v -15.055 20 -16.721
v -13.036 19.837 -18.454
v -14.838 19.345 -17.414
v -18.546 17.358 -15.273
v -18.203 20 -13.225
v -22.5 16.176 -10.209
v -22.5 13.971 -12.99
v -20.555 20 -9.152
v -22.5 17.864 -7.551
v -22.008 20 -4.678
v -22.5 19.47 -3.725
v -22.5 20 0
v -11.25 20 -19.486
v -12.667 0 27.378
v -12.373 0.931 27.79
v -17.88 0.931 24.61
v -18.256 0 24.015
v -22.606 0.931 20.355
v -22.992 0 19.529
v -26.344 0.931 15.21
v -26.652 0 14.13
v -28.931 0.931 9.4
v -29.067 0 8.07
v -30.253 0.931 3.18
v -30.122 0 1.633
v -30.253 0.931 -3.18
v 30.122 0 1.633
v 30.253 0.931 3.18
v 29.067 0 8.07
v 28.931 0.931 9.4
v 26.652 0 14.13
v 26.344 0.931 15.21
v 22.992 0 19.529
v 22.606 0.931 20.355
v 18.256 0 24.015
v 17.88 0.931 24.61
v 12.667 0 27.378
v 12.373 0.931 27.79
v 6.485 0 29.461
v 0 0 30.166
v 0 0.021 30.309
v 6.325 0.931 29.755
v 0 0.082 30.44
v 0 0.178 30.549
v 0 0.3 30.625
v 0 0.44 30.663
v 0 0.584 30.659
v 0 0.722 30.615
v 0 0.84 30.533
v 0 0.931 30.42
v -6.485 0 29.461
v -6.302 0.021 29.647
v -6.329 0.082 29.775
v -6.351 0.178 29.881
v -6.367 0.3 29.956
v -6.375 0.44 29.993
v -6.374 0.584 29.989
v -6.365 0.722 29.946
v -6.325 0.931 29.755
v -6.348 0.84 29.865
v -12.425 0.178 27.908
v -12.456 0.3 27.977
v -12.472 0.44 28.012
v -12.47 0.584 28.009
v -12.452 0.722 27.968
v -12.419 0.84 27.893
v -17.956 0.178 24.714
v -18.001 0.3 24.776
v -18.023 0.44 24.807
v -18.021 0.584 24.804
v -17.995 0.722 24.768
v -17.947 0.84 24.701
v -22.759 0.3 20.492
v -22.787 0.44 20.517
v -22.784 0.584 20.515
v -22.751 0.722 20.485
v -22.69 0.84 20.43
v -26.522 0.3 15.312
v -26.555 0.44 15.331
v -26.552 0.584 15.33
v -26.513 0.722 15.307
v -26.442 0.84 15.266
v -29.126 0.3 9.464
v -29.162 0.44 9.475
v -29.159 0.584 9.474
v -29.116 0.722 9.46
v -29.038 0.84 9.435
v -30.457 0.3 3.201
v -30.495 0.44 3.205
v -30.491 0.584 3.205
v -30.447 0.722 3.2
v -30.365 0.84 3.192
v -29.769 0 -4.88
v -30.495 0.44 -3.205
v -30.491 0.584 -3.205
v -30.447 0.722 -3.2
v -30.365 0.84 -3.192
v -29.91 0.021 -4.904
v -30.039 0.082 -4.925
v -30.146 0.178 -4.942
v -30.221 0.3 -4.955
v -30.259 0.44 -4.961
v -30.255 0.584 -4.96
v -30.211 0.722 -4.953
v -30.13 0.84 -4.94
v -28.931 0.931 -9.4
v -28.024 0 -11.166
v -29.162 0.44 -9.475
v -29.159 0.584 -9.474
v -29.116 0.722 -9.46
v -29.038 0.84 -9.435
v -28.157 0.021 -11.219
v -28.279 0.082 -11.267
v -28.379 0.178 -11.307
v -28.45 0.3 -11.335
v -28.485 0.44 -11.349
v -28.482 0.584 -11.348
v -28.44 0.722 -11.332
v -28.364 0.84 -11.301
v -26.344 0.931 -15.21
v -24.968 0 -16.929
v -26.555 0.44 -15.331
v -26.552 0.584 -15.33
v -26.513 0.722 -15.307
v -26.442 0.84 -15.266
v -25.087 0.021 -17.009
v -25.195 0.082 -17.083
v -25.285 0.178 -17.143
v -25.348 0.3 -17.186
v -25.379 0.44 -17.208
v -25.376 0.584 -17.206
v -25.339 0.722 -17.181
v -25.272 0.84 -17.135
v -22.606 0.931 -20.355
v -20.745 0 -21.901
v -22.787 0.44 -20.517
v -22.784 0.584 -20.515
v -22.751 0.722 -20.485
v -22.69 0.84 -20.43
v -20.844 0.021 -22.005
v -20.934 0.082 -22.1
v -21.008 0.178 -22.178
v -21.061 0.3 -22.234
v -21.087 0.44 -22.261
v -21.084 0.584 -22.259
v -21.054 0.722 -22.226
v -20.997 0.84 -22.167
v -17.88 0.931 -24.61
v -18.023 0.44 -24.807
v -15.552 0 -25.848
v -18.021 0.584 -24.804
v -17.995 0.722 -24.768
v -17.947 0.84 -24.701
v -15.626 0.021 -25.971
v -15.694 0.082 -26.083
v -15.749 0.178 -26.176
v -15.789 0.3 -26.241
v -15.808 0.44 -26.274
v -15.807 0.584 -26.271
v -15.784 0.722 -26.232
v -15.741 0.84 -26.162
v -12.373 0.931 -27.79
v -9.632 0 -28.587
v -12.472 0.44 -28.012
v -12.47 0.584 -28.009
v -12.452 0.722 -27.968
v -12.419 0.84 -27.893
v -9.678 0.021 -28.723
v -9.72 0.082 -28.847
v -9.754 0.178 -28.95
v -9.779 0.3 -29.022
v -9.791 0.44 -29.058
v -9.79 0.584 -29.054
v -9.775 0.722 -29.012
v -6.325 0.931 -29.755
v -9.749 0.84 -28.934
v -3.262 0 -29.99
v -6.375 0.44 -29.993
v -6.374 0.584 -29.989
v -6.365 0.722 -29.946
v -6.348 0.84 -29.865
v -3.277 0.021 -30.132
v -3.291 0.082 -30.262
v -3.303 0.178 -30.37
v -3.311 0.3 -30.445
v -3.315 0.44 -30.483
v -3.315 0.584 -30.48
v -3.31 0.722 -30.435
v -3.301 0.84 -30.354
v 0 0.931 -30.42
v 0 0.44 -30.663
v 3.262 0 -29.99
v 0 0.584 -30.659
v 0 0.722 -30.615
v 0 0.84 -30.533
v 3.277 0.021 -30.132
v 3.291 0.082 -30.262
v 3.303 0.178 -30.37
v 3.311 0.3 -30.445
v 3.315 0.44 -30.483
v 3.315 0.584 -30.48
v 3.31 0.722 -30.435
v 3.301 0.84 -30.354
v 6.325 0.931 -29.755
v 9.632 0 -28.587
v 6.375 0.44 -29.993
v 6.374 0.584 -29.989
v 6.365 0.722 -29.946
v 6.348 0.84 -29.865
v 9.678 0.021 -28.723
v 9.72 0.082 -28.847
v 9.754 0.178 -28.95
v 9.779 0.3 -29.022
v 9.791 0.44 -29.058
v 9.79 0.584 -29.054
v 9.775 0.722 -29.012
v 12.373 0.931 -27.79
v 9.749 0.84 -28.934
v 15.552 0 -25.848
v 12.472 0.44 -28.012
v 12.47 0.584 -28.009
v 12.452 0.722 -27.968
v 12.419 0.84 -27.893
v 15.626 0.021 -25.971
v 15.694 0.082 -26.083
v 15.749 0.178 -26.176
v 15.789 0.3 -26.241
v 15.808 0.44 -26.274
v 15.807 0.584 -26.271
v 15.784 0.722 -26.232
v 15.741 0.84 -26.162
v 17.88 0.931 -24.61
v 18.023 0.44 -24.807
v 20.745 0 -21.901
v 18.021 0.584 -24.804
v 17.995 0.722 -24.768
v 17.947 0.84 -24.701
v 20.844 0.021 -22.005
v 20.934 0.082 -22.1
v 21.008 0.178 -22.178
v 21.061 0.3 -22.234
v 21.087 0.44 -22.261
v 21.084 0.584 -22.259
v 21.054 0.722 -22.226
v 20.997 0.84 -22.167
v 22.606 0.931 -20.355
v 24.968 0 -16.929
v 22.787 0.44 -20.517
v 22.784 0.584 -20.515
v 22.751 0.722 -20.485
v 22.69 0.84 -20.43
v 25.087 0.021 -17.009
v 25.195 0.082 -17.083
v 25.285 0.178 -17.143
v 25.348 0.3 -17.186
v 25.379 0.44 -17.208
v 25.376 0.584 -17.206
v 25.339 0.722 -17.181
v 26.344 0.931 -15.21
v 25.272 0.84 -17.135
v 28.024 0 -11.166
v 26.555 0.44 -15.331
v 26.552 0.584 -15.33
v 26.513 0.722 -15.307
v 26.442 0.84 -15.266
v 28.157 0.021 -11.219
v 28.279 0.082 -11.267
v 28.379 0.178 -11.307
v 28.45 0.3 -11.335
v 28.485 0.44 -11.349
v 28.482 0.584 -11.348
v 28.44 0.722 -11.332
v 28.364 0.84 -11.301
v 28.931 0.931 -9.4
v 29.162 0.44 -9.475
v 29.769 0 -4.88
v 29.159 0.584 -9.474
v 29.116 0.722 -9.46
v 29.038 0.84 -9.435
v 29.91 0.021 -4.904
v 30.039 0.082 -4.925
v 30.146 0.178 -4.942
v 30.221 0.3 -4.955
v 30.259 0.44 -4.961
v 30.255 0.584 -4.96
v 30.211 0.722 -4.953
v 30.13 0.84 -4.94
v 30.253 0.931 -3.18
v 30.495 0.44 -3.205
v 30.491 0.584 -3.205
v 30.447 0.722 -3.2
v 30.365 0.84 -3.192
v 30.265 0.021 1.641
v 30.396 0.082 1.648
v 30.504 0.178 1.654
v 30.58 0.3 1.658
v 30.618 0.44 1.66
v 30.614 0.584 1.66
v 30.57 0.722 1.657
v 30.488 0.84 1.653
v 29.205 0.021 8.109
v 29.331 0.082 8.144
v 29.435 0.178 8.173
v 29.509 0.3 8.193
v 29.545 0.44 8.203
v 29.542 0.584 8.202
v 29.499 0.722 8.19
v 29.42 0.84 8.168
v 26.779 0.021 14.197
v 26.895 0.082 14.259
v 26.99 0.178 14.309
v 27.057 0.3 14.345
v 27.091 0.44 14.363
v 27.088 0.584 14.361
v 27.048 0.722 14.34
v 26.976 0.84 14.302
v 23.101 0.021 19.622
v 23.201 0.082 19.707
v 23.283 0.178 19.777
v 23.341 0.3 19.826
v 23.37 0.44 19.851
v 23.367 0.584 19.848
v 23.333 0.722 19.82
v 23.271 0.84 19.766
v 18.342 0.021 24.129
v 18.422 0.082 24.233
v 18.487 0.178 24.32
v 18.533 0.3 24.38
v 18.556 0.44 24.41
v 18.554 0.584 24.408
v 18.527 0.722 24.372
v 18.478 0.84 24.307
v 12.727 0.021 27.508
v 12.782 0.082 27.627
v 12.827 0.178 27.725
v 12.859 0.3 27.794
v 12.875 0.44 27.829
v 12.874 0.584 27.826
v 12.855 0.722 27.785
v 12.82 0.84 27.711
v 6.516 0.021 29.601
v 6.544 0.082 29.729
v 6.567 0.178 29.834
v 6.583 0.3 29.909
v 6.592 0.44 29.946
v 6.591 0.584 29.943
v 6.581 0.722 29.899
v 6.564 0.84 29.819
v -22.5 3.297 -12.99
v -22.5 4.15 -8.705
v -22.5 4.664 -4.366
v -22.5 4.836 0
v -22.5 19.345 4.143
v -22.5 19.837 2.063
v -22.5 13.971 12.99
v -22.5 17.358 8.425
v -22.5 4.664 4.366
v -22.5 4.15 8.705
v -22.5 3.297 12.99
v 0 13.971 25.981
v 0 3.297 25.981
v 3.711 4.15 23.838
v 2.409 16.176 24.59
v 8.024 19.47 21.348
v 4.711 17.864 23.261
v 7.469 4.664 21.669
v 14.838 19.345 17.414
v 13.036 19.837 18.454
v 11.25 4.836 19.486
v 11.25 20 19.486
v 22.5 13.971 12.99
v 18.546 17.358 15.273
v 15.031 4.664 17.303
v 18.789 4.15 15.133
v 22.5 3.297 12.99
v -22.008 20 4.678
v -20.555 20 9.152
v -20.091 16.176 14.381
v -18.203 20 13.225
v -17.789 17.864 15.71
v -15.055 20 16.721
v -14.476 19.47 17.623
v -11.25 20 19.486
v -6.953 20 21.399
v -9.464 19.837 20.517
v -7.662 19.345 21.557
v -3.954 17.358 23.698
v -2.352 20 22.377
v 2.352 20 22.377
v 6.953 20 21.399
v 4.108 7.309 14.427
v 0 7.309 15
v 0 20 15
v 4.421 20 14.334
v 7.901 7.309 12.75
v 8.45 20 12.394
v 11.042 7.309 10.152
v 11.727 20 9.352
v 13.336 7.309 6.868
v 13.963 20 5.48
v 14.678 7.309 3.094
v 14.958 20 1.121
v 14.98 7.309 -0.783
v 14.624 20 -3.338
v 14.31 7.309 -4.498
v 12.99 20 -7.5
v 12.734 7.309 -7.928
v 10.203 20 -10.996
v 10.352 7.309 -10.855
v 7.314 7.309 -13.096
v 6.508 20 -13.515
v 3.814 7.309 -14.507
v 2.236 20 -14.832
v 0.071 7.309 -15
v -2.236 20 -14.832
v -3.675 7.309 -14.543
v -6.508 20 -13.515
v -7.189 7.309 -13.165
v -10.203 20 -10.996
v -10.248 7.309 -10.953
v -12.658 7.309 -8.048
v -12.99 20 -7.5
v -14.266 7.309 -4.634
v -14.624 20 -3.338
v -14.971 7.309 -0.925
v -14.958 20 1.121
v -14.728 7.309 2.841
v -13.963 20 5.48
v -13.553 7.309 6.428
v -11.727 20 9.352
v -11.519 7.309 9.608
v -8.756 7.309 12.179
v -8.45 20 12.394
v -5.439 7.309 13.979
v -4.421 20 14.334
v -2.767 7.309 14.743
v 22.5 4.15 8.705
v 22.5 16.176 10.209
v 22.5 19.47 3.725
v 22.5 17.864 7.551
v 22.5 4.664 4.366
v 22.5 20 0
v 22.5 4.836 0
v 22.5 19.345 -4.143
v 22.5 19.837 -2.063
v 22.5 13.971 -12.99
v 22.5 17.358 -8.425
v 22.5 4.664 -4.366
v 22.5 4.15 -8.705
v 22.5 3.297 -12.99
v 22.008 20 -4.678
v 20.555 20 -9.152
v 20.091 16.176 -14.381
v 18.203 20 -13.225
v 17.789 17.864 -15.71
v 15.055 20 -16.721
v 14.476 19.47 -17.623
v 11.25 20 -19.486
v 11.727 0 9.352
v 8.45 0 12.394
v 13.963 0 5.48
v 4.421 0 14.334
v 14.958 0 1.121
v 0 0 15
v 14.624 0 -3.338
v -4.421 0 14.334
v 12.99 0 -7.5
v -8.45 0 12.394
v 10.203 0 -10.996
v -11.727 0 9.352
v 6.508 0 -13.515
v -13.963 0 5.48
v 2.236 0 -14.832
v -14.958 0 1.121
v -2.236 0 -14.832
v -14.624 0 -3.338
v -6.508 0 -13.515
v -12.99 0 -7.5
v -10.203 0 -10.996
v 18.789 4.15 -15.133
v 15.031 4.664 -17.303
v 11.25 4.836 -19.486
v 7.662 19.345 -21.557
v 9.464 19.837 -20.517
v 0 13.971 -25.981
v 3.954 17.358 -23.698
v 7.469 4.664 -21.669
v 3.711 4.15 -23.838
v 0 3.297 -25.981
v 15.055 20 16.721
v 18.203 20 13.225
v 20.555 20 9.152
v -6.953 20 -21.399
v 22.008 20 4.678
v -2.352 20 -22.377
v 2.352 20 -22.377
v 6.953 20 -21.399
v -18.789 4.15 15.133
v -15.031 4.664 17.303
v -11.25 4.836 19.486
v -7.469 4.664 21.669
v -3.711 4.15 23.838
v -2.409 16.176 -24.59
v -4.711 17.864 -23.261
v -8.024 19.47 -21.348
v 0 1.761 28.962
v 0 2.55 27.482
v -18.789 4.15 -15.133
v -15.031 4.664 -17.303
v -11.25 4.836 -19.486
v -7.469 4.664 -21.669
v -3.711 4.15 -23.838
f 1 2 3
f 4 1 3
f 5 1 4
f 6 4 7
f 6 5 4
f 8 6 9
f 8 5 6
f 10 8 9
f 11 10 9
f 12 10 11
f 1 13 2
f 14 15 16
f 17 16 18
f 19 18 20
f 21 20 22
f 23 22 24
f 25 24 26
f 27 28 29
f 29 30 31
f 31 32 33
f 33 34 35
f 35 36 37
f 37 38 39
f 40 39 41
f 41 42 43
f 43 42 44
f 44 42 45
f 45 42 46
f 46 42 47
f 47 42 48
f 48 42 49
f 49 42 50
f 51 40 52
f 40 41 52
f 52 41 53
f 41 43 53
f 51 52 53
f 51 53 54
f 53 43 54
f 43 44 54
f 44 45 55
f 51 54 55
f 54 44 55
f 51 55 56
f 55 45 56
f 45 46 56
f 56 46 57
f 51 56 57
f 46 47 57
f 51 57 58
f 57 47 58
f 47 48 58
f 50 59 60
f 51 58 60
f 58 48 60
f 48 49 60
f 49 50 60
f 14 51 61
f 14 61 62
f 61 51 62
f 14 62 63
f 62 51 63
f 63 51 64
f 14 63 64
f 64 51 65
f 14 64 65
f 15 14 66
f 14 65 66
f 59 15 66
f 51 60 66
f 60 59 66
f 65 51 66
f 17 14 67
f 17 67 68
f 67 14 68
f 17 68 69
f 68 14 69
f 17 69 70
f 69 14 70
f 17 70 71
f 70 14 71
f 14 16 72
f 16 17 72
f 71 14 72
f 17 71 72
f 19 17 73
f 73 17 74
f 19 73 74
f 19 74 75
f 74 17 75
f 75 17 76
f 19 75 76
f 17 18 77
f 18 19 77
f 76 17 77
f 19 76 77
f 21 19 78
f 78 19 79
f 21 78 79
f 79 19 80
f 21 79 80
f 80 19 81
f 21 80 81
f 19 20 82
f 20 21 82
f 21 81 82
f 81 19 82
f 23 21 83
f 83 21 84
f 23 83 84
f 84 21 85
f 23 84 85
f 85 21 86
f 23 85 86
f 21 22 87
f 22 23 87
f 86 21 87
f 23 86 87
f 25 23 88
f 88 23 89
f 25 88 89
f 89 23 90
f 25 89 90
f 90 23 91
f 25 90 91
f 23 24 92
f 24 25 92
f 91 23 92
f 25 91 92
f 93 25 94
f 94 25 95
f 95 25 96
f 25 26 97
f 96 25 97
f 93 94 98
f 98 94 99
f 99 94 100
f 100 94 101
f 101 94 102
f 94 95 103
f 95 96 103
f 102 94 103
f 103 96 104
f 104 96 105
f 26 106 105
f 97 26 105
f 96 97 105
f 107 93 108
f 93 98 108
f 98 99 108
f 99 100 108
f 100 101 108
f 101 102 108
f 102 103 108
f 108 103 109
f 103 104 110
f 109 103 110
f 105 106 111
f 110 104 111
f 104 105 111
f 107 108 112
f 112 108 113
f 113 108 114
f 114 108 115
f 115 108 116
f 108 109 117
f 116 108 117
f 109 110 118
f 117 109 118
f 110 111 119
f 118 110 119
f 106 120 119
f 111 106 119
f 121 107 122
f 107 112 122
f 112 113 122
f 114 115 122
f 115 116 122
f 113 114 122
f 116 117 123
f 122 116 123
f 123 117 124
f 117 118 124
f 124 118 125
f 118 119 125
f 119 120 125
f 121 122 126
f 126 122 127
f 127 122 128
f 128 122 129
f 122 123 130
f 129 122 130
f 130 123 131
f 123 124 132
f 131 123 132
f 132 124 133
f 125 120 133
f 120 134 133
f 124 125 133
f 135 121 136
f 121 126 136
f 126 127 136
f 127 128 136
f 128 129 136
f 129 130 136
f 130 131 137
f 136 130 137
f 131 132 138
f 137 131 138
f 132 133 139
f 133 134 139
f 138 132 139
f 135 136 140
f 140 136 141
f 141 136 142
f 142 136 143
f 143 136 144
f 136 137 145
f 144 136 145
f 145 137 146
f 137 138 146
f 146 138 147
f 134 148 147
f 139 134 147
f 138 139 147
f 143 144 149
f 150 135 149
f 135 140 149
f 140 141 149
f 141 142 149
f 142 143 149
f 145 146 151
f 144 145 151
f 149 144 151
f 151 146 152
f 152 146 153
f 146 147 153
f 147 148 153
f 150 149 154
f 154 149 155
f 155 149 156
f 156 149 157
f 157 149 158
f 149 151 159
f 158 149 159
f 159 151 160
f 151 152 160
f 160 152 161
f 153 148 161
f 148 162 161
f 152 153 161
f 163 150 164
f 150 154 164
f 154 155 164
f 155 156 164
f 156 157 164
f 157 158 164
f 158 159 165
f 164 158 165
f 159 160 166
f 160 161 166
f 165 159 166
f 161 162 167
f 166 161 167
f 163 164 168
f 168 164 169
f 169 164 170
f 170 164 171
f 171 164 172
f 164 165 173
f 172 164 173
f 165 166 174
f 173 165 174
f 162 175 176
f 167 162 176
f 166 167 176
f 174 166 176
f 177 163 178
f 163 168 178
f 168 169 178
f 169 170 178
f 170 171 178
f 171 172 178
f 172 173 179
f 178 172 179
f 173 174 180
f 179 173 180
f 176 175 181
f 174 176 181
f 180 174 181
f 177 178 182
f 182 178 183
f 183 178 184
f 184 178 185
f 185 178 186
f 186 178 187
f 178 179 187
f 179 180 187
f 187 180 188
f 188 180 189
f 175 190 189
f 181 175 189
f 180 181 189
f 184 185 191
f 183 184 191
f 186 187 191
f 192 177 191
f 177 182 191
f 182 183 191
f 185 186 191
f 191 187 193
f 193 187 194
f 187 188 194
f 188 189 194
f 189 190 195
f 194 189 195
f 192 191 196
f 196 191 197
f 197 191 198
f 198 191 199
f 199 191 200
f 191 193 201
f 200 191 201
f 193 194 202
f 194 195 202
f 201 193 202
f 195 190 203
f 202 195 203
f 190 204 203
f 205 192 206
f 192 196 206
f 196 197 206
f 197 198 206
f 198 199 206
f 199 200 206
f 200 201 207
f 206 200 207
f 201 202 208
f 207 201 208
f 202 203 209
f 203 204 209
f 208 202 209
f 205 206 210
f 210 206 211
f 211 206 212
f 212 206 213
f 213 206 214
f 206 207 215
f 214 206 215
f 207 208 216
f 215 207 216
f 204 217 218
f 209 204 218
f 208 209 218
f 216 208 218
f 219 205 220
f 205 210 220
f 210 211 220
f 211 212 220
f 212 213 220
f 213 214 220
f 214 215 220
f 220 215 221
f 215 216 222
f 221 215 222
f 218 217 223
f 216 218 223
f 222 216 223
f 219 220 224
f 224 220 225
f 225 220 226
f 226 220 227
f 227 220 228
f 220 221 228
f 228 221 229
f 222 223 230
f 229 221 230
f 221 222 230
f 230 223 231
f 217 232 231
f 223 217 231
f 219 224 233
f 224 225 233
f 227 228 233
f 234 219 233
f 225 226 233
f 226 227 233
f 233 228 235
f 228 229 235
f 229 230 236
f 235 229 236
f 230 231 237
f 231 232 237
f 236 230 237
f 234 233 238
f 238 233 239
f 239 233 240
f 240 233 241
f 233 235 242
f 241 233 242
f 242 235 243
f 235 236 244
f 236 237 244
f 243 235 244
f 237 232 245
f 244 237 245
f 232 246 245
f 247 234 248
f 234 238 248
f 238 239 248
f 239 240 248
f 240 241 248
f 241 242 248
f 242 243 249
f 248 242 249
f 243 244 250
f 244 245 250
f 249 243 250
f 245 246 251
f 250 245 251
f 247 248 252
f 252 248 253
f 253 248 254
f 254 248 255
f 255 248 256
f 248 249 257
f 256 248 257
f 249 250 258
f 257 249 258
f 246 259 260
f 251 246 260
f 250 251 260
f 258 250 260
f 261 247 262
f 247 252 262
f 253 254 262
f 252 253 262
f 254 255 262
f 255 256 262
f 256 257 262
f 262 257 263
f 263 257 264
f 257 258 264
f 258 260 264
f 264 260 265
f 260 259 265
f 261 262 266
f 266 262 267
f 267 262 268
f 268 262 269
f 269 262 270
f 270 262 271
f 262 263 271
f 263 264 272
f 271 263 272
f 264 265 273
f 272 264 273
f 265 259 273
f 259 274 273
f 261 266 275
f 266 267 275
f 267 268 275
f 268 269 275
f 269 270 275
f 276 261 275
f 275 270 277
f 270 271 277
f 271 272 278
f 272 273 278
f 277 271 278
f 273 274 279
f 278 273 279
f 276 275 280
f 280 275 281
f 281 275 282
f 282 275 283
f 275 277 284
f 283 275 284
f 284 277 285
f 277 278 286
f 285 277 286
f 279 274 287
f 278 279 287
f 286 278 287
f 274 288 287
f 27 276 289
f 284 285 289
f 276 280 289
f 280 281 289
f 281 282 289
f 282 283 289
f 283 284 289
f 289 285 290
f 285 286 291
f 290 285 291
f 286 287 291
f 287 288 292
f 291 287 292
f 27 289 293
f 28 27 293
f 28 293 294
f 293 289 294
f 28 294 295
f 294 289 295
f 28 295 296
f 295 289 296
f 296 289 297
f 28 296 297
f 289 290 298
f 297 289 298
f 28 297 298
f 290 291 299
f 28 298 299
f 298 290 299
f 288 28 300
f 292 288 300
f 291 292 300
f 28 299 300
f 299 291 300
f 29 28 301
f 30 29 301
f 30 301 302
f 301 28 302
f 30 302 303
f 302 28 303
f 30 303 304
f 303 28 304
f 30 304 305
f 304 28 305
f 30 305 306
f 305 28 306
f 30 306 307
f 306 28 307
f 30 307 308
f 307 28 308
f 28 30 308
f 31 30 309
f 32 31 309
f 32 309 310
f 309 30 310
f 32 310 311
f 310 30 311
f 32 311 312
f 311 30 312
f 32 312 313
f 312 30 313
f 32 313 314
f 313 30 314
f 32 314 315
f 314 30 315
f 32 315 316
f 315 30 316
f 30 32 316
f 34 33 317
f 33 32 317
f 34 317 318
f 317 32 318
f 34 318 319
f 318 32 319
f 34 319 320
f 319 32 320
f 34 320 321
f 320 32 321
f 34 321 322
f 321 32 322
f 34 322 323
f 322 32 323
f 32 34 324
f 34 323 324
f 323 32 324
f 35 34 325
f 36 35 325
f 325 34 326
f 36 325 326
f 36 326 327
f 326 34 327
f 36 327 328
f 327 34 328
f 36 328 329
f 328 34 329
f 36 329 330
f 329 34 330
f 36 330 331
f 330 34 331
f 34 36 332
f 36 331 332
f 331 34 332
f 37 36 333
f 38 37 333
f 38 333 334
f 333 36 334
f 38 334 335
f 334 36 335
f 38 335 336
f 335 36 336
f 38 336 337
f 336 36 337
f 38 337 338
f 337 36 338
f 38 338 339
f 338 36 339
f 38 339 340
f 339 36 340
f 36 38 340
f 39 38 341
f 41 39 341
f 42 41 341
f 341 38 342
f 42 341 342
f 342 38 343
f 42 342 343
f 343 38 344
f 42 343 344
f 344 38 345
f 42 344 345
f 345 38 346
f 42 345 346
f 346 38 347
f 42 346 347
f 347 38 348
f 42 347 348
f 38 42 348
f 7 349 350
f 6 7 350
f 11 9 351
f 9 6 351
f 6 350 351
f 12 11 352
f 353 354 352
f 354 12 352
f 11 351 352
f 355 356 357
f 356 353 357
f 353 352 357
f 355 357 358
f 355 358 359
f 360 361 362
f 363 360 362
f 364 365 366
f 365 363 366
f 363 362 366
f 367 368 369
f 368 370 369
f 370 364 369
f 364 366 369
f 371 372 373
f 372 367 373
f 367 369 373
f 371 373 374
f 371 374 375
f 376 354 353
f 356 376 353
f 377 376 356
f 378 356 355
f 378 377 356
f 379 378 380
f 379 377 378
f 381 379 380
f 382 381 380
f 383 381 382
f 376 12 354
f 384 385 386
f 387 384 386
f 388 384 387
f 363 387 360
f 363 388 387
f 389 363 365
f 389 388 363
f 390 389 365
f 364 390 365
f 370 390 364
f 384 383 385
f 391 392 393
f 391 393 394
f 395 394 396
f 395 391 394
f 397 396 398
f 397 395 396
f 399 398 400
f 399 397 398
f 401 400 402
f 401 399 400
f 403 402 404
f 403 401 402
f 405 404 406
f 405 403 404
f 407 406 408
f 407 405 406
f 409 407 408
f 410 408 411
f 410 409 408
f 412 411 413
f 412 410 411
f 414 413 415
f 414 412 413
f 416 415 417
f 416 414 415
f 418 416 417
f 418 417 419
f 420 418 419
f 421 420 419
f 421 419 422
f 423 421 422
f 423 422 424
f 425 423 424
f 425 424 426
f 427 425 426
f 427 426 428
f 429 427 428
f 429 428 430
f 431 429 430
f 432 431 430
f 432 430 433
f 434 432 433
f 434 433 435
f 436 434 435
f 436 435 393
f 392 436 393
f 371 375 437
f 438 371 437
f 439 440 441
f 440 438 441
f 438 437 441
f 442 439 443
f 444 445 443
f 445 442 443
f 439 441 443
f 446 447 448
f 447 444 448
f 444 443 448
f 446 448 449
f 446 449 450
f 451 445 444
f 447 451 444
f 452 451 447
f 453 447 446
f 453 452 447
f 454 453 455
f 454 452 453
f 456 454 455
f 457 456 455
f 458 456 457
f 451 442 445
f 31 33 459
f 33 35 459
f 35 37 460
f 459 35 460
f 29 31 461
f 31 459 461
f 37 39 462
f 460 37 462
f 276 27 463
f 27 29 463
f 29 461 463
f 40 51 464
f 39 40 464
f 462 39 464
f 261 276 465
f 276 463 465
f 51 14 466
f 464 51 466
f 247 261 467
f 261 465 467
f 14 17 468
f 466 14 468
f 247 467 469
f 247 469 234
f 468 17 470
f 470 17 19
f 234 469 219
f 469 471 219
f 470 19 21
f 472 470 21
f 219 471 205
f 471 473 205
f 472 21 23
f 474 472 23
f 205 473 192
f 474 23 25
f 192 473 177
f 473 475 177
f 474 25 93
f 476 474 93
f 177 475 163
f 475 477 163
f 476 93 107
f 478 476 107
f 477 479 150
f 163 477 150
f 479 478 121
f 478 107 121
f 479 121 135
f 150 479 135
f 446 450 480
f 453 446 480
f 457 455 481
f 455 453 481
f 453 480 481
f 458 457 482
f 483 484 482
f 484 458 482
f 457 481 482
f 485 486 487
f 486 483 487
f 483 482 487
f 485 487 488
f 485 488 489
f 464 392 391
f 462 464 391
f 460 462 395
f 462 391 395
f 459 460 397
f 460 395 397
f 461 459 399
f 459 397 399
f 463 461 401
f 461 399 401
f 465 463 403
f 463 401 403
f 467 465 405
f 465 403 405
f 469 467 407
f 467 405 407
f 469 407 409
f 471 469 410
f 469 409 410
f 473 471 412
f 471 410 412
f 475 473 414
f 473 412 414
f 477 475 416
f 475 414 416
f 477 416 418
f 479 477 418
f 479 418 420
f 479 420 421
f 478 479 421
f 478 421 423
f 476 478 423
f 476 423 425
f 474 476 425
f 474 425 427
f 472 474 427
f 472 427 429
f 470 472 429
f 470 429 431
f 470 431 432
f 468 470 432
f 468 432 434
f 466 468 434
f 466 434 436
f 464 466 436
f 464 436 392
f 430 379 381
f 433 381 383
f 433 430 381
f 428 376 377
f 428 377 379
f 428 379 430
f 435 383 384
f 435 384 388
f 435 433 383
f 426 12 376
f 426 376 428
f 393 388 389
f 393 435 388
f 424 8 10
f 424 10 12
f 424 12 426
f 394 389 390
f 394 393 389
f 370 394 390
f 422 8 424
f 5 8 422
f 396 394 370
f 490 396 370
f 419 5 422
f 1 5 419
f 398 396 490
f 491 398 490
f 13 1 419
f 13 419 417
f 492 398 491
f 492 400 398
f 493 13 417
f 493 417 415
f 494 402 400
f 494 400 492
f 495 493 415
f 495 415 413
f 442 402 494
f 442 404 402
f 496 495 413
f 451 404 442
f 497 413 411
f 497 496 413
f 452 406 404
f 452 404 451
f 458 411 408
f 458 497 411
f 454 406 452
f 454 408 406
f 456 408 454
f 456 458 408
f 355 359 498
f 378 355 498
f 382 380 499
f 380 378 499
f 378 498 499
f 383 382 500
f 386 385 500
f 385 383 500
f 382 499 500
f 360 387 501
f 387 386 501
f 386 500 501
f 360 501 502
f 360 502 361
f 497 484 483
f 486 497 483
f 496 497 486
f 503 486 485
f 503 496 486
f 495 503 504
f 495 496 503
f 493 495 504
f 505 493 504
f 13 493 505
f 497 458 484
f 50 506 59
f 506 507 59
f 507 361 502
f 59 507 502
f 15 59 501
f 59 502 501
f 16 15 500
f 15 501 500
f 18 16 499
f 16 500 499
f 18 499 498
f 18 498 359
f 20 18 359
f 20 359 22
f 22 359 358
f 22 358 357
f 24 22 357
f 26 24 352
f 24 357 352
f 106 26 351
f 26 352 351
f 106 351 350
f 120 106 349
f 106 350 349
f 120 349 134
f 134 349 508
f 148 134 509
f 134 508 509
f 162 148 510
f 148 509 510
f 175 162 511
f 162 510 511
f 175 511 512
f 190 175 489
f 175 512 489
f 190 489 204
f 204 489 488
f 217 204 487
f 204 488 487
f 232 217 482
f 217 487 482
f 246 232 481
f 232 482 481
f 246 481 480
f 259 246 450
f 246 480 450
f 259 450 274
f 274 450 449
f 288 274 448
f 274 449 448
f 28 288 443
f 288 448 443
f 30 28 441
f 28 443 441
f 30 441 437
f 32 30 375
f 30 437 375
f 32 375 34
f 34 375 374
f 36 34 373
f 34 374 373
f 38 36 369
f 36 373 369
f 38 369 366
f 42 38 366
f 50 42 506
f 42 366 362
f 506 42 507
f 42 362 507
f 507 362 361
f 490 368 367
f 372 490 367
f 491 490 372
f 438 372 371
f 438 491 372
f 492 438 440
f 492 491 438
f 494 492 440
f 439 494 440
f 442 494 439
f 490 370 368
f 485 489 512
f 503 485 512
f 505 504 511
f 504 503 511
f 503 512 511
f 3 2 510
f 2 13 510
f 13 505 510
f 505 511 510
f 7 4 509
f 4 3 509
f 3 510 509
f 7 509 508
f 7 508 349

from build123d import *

# Parameters (mm, degrees)
SKETCH1_R           = 15
BOSS_EXTRUDE1_DEPTH = 20
SKETCH2_OUTSIDE_W   = 104.228
SKETCH2_OUTSIDE_H   = 104.228
SKETCH2_OUTSIDE_R   = 22.5
CUT_EXTRUDE1_DEPTH  = 20
CUT_EXTRUDE1_DRAFT  = -30
CUT_EXTRUDE2_REACH  = 49.758
SKETCH4_R           = 15


with BuildPart() as part:
    # Sketch1 → Boss-Extrude1 (new body)
    with BuildSketch(Plane(origin=(0, 0, 0), x_dir=(1, 0, 0), z_dir=(0, 1, 0))):
        Polygon((0, 25.980762114), (-22.5, 12.990381057), (-22.5, -12.990381057), (0, -25.980762114), (22.5, -12.990381057), (22.5, 12.990381057), align=None)
        with Locations(Location((0, 0, 0), (0, 0, 270))):
            Circle(SKETCH1_R, mode=Mode.SUBTRACT)
    extrude(amount=BOSS_EXTRUDE1_DEPTH)

    # Sketch3 → Revolve1 (revolve)
    with BuildSketch(Plane.XY, mode=Mode.PRIVATE) as revolve1_sk:
        with BuildLine():
            Line((0, 9.214199819), (0, 0))
            Line((0, 0), (30.166483054, 0))
            ThreePointArc((30.166483054, 0), (30.648917793, 0.368635156), (30.419982911, 0.930973111))
            ThreePointArc((30.419982911, 0.930973111), (15.763781312, 7.106368536), (0, 9.214199819))
        make_face()
    revolve(revolve1_sk.sketch.rotate(Axis((0, 0, 0), (0, -1, 0)), 90), axis=Axis((0, 0, 0), (0, -1, 0)))


with BuildPart() as cut_extrude1_tool:
    # Sketch2 outside → Cut-Extrude1 (with draft: the straight prism first)
    with BuildSketch(Plane(origin=(0, 20, 0), x_dir=(1, 0, 0), z_dir=(0, 1, 0))):
        Rectangle(SKETCH2_OUTSIDE_W, SKETCH2_OUTSIDE_H)
        Circle(SKETCH2_OUTSIDE_R, mode=Mode.SUBTRACT)
    extrude(amount=-CUT_EXTRUDE1_DEPTH)
    # Cut-Extrude1: the draft: its side faces are tilted about the plane it starts from
    cut_extrude1_sides = [cut_extrude1_tool.faces().sort_by_distance(p)[0] for p in [
        (0, 10, 52.114),
        (52.114, 10, 0),
        (0, 10, -52.114),
        (-52.114, 10, 0),
        (-22.5, 10, 0),
    ]]
    draft(cut_extrude1_sides, Plane(origin=(0, 20, 0), x_dir=(1, 0, 0), z_dir=(0, 1, 0)), CUT_EXTRUDE1_DRAFT)


with BuildPart() as part_1:
    add(part.part)

    # Cut-Extrude1: cut by cut_extrude1_tool
    add(cut_extrude1_tool.part, mode=Mode.SUBTRACT)

    # Sketch4 → Cut-Extrude2 (cut, up to next)
    with BuildSketch(Plane(origin=(0, 20, 0), x_dir=(1, 0, 0), z_dir=(0, 1, 0)), mode=Mode.PRIVATE) as cut_extrude2_sk1:
        with Locations(Location((0, 0, 0), (0, 0, 270))):
            Circle(SKETCH4_R)
    cut_extrude2_tool1 = extrude(cut_extrude2_sk1.sketch, amount=-CUT_EXTRUDE2_REACH, mode=Mode.PRIVATE) & part_1.part
    add(cut_extrude2_tool1.solids().sort_by_distance((0, 20, 0))[0], mode=Mode.SUBTRACT)


solid = part_1.part
